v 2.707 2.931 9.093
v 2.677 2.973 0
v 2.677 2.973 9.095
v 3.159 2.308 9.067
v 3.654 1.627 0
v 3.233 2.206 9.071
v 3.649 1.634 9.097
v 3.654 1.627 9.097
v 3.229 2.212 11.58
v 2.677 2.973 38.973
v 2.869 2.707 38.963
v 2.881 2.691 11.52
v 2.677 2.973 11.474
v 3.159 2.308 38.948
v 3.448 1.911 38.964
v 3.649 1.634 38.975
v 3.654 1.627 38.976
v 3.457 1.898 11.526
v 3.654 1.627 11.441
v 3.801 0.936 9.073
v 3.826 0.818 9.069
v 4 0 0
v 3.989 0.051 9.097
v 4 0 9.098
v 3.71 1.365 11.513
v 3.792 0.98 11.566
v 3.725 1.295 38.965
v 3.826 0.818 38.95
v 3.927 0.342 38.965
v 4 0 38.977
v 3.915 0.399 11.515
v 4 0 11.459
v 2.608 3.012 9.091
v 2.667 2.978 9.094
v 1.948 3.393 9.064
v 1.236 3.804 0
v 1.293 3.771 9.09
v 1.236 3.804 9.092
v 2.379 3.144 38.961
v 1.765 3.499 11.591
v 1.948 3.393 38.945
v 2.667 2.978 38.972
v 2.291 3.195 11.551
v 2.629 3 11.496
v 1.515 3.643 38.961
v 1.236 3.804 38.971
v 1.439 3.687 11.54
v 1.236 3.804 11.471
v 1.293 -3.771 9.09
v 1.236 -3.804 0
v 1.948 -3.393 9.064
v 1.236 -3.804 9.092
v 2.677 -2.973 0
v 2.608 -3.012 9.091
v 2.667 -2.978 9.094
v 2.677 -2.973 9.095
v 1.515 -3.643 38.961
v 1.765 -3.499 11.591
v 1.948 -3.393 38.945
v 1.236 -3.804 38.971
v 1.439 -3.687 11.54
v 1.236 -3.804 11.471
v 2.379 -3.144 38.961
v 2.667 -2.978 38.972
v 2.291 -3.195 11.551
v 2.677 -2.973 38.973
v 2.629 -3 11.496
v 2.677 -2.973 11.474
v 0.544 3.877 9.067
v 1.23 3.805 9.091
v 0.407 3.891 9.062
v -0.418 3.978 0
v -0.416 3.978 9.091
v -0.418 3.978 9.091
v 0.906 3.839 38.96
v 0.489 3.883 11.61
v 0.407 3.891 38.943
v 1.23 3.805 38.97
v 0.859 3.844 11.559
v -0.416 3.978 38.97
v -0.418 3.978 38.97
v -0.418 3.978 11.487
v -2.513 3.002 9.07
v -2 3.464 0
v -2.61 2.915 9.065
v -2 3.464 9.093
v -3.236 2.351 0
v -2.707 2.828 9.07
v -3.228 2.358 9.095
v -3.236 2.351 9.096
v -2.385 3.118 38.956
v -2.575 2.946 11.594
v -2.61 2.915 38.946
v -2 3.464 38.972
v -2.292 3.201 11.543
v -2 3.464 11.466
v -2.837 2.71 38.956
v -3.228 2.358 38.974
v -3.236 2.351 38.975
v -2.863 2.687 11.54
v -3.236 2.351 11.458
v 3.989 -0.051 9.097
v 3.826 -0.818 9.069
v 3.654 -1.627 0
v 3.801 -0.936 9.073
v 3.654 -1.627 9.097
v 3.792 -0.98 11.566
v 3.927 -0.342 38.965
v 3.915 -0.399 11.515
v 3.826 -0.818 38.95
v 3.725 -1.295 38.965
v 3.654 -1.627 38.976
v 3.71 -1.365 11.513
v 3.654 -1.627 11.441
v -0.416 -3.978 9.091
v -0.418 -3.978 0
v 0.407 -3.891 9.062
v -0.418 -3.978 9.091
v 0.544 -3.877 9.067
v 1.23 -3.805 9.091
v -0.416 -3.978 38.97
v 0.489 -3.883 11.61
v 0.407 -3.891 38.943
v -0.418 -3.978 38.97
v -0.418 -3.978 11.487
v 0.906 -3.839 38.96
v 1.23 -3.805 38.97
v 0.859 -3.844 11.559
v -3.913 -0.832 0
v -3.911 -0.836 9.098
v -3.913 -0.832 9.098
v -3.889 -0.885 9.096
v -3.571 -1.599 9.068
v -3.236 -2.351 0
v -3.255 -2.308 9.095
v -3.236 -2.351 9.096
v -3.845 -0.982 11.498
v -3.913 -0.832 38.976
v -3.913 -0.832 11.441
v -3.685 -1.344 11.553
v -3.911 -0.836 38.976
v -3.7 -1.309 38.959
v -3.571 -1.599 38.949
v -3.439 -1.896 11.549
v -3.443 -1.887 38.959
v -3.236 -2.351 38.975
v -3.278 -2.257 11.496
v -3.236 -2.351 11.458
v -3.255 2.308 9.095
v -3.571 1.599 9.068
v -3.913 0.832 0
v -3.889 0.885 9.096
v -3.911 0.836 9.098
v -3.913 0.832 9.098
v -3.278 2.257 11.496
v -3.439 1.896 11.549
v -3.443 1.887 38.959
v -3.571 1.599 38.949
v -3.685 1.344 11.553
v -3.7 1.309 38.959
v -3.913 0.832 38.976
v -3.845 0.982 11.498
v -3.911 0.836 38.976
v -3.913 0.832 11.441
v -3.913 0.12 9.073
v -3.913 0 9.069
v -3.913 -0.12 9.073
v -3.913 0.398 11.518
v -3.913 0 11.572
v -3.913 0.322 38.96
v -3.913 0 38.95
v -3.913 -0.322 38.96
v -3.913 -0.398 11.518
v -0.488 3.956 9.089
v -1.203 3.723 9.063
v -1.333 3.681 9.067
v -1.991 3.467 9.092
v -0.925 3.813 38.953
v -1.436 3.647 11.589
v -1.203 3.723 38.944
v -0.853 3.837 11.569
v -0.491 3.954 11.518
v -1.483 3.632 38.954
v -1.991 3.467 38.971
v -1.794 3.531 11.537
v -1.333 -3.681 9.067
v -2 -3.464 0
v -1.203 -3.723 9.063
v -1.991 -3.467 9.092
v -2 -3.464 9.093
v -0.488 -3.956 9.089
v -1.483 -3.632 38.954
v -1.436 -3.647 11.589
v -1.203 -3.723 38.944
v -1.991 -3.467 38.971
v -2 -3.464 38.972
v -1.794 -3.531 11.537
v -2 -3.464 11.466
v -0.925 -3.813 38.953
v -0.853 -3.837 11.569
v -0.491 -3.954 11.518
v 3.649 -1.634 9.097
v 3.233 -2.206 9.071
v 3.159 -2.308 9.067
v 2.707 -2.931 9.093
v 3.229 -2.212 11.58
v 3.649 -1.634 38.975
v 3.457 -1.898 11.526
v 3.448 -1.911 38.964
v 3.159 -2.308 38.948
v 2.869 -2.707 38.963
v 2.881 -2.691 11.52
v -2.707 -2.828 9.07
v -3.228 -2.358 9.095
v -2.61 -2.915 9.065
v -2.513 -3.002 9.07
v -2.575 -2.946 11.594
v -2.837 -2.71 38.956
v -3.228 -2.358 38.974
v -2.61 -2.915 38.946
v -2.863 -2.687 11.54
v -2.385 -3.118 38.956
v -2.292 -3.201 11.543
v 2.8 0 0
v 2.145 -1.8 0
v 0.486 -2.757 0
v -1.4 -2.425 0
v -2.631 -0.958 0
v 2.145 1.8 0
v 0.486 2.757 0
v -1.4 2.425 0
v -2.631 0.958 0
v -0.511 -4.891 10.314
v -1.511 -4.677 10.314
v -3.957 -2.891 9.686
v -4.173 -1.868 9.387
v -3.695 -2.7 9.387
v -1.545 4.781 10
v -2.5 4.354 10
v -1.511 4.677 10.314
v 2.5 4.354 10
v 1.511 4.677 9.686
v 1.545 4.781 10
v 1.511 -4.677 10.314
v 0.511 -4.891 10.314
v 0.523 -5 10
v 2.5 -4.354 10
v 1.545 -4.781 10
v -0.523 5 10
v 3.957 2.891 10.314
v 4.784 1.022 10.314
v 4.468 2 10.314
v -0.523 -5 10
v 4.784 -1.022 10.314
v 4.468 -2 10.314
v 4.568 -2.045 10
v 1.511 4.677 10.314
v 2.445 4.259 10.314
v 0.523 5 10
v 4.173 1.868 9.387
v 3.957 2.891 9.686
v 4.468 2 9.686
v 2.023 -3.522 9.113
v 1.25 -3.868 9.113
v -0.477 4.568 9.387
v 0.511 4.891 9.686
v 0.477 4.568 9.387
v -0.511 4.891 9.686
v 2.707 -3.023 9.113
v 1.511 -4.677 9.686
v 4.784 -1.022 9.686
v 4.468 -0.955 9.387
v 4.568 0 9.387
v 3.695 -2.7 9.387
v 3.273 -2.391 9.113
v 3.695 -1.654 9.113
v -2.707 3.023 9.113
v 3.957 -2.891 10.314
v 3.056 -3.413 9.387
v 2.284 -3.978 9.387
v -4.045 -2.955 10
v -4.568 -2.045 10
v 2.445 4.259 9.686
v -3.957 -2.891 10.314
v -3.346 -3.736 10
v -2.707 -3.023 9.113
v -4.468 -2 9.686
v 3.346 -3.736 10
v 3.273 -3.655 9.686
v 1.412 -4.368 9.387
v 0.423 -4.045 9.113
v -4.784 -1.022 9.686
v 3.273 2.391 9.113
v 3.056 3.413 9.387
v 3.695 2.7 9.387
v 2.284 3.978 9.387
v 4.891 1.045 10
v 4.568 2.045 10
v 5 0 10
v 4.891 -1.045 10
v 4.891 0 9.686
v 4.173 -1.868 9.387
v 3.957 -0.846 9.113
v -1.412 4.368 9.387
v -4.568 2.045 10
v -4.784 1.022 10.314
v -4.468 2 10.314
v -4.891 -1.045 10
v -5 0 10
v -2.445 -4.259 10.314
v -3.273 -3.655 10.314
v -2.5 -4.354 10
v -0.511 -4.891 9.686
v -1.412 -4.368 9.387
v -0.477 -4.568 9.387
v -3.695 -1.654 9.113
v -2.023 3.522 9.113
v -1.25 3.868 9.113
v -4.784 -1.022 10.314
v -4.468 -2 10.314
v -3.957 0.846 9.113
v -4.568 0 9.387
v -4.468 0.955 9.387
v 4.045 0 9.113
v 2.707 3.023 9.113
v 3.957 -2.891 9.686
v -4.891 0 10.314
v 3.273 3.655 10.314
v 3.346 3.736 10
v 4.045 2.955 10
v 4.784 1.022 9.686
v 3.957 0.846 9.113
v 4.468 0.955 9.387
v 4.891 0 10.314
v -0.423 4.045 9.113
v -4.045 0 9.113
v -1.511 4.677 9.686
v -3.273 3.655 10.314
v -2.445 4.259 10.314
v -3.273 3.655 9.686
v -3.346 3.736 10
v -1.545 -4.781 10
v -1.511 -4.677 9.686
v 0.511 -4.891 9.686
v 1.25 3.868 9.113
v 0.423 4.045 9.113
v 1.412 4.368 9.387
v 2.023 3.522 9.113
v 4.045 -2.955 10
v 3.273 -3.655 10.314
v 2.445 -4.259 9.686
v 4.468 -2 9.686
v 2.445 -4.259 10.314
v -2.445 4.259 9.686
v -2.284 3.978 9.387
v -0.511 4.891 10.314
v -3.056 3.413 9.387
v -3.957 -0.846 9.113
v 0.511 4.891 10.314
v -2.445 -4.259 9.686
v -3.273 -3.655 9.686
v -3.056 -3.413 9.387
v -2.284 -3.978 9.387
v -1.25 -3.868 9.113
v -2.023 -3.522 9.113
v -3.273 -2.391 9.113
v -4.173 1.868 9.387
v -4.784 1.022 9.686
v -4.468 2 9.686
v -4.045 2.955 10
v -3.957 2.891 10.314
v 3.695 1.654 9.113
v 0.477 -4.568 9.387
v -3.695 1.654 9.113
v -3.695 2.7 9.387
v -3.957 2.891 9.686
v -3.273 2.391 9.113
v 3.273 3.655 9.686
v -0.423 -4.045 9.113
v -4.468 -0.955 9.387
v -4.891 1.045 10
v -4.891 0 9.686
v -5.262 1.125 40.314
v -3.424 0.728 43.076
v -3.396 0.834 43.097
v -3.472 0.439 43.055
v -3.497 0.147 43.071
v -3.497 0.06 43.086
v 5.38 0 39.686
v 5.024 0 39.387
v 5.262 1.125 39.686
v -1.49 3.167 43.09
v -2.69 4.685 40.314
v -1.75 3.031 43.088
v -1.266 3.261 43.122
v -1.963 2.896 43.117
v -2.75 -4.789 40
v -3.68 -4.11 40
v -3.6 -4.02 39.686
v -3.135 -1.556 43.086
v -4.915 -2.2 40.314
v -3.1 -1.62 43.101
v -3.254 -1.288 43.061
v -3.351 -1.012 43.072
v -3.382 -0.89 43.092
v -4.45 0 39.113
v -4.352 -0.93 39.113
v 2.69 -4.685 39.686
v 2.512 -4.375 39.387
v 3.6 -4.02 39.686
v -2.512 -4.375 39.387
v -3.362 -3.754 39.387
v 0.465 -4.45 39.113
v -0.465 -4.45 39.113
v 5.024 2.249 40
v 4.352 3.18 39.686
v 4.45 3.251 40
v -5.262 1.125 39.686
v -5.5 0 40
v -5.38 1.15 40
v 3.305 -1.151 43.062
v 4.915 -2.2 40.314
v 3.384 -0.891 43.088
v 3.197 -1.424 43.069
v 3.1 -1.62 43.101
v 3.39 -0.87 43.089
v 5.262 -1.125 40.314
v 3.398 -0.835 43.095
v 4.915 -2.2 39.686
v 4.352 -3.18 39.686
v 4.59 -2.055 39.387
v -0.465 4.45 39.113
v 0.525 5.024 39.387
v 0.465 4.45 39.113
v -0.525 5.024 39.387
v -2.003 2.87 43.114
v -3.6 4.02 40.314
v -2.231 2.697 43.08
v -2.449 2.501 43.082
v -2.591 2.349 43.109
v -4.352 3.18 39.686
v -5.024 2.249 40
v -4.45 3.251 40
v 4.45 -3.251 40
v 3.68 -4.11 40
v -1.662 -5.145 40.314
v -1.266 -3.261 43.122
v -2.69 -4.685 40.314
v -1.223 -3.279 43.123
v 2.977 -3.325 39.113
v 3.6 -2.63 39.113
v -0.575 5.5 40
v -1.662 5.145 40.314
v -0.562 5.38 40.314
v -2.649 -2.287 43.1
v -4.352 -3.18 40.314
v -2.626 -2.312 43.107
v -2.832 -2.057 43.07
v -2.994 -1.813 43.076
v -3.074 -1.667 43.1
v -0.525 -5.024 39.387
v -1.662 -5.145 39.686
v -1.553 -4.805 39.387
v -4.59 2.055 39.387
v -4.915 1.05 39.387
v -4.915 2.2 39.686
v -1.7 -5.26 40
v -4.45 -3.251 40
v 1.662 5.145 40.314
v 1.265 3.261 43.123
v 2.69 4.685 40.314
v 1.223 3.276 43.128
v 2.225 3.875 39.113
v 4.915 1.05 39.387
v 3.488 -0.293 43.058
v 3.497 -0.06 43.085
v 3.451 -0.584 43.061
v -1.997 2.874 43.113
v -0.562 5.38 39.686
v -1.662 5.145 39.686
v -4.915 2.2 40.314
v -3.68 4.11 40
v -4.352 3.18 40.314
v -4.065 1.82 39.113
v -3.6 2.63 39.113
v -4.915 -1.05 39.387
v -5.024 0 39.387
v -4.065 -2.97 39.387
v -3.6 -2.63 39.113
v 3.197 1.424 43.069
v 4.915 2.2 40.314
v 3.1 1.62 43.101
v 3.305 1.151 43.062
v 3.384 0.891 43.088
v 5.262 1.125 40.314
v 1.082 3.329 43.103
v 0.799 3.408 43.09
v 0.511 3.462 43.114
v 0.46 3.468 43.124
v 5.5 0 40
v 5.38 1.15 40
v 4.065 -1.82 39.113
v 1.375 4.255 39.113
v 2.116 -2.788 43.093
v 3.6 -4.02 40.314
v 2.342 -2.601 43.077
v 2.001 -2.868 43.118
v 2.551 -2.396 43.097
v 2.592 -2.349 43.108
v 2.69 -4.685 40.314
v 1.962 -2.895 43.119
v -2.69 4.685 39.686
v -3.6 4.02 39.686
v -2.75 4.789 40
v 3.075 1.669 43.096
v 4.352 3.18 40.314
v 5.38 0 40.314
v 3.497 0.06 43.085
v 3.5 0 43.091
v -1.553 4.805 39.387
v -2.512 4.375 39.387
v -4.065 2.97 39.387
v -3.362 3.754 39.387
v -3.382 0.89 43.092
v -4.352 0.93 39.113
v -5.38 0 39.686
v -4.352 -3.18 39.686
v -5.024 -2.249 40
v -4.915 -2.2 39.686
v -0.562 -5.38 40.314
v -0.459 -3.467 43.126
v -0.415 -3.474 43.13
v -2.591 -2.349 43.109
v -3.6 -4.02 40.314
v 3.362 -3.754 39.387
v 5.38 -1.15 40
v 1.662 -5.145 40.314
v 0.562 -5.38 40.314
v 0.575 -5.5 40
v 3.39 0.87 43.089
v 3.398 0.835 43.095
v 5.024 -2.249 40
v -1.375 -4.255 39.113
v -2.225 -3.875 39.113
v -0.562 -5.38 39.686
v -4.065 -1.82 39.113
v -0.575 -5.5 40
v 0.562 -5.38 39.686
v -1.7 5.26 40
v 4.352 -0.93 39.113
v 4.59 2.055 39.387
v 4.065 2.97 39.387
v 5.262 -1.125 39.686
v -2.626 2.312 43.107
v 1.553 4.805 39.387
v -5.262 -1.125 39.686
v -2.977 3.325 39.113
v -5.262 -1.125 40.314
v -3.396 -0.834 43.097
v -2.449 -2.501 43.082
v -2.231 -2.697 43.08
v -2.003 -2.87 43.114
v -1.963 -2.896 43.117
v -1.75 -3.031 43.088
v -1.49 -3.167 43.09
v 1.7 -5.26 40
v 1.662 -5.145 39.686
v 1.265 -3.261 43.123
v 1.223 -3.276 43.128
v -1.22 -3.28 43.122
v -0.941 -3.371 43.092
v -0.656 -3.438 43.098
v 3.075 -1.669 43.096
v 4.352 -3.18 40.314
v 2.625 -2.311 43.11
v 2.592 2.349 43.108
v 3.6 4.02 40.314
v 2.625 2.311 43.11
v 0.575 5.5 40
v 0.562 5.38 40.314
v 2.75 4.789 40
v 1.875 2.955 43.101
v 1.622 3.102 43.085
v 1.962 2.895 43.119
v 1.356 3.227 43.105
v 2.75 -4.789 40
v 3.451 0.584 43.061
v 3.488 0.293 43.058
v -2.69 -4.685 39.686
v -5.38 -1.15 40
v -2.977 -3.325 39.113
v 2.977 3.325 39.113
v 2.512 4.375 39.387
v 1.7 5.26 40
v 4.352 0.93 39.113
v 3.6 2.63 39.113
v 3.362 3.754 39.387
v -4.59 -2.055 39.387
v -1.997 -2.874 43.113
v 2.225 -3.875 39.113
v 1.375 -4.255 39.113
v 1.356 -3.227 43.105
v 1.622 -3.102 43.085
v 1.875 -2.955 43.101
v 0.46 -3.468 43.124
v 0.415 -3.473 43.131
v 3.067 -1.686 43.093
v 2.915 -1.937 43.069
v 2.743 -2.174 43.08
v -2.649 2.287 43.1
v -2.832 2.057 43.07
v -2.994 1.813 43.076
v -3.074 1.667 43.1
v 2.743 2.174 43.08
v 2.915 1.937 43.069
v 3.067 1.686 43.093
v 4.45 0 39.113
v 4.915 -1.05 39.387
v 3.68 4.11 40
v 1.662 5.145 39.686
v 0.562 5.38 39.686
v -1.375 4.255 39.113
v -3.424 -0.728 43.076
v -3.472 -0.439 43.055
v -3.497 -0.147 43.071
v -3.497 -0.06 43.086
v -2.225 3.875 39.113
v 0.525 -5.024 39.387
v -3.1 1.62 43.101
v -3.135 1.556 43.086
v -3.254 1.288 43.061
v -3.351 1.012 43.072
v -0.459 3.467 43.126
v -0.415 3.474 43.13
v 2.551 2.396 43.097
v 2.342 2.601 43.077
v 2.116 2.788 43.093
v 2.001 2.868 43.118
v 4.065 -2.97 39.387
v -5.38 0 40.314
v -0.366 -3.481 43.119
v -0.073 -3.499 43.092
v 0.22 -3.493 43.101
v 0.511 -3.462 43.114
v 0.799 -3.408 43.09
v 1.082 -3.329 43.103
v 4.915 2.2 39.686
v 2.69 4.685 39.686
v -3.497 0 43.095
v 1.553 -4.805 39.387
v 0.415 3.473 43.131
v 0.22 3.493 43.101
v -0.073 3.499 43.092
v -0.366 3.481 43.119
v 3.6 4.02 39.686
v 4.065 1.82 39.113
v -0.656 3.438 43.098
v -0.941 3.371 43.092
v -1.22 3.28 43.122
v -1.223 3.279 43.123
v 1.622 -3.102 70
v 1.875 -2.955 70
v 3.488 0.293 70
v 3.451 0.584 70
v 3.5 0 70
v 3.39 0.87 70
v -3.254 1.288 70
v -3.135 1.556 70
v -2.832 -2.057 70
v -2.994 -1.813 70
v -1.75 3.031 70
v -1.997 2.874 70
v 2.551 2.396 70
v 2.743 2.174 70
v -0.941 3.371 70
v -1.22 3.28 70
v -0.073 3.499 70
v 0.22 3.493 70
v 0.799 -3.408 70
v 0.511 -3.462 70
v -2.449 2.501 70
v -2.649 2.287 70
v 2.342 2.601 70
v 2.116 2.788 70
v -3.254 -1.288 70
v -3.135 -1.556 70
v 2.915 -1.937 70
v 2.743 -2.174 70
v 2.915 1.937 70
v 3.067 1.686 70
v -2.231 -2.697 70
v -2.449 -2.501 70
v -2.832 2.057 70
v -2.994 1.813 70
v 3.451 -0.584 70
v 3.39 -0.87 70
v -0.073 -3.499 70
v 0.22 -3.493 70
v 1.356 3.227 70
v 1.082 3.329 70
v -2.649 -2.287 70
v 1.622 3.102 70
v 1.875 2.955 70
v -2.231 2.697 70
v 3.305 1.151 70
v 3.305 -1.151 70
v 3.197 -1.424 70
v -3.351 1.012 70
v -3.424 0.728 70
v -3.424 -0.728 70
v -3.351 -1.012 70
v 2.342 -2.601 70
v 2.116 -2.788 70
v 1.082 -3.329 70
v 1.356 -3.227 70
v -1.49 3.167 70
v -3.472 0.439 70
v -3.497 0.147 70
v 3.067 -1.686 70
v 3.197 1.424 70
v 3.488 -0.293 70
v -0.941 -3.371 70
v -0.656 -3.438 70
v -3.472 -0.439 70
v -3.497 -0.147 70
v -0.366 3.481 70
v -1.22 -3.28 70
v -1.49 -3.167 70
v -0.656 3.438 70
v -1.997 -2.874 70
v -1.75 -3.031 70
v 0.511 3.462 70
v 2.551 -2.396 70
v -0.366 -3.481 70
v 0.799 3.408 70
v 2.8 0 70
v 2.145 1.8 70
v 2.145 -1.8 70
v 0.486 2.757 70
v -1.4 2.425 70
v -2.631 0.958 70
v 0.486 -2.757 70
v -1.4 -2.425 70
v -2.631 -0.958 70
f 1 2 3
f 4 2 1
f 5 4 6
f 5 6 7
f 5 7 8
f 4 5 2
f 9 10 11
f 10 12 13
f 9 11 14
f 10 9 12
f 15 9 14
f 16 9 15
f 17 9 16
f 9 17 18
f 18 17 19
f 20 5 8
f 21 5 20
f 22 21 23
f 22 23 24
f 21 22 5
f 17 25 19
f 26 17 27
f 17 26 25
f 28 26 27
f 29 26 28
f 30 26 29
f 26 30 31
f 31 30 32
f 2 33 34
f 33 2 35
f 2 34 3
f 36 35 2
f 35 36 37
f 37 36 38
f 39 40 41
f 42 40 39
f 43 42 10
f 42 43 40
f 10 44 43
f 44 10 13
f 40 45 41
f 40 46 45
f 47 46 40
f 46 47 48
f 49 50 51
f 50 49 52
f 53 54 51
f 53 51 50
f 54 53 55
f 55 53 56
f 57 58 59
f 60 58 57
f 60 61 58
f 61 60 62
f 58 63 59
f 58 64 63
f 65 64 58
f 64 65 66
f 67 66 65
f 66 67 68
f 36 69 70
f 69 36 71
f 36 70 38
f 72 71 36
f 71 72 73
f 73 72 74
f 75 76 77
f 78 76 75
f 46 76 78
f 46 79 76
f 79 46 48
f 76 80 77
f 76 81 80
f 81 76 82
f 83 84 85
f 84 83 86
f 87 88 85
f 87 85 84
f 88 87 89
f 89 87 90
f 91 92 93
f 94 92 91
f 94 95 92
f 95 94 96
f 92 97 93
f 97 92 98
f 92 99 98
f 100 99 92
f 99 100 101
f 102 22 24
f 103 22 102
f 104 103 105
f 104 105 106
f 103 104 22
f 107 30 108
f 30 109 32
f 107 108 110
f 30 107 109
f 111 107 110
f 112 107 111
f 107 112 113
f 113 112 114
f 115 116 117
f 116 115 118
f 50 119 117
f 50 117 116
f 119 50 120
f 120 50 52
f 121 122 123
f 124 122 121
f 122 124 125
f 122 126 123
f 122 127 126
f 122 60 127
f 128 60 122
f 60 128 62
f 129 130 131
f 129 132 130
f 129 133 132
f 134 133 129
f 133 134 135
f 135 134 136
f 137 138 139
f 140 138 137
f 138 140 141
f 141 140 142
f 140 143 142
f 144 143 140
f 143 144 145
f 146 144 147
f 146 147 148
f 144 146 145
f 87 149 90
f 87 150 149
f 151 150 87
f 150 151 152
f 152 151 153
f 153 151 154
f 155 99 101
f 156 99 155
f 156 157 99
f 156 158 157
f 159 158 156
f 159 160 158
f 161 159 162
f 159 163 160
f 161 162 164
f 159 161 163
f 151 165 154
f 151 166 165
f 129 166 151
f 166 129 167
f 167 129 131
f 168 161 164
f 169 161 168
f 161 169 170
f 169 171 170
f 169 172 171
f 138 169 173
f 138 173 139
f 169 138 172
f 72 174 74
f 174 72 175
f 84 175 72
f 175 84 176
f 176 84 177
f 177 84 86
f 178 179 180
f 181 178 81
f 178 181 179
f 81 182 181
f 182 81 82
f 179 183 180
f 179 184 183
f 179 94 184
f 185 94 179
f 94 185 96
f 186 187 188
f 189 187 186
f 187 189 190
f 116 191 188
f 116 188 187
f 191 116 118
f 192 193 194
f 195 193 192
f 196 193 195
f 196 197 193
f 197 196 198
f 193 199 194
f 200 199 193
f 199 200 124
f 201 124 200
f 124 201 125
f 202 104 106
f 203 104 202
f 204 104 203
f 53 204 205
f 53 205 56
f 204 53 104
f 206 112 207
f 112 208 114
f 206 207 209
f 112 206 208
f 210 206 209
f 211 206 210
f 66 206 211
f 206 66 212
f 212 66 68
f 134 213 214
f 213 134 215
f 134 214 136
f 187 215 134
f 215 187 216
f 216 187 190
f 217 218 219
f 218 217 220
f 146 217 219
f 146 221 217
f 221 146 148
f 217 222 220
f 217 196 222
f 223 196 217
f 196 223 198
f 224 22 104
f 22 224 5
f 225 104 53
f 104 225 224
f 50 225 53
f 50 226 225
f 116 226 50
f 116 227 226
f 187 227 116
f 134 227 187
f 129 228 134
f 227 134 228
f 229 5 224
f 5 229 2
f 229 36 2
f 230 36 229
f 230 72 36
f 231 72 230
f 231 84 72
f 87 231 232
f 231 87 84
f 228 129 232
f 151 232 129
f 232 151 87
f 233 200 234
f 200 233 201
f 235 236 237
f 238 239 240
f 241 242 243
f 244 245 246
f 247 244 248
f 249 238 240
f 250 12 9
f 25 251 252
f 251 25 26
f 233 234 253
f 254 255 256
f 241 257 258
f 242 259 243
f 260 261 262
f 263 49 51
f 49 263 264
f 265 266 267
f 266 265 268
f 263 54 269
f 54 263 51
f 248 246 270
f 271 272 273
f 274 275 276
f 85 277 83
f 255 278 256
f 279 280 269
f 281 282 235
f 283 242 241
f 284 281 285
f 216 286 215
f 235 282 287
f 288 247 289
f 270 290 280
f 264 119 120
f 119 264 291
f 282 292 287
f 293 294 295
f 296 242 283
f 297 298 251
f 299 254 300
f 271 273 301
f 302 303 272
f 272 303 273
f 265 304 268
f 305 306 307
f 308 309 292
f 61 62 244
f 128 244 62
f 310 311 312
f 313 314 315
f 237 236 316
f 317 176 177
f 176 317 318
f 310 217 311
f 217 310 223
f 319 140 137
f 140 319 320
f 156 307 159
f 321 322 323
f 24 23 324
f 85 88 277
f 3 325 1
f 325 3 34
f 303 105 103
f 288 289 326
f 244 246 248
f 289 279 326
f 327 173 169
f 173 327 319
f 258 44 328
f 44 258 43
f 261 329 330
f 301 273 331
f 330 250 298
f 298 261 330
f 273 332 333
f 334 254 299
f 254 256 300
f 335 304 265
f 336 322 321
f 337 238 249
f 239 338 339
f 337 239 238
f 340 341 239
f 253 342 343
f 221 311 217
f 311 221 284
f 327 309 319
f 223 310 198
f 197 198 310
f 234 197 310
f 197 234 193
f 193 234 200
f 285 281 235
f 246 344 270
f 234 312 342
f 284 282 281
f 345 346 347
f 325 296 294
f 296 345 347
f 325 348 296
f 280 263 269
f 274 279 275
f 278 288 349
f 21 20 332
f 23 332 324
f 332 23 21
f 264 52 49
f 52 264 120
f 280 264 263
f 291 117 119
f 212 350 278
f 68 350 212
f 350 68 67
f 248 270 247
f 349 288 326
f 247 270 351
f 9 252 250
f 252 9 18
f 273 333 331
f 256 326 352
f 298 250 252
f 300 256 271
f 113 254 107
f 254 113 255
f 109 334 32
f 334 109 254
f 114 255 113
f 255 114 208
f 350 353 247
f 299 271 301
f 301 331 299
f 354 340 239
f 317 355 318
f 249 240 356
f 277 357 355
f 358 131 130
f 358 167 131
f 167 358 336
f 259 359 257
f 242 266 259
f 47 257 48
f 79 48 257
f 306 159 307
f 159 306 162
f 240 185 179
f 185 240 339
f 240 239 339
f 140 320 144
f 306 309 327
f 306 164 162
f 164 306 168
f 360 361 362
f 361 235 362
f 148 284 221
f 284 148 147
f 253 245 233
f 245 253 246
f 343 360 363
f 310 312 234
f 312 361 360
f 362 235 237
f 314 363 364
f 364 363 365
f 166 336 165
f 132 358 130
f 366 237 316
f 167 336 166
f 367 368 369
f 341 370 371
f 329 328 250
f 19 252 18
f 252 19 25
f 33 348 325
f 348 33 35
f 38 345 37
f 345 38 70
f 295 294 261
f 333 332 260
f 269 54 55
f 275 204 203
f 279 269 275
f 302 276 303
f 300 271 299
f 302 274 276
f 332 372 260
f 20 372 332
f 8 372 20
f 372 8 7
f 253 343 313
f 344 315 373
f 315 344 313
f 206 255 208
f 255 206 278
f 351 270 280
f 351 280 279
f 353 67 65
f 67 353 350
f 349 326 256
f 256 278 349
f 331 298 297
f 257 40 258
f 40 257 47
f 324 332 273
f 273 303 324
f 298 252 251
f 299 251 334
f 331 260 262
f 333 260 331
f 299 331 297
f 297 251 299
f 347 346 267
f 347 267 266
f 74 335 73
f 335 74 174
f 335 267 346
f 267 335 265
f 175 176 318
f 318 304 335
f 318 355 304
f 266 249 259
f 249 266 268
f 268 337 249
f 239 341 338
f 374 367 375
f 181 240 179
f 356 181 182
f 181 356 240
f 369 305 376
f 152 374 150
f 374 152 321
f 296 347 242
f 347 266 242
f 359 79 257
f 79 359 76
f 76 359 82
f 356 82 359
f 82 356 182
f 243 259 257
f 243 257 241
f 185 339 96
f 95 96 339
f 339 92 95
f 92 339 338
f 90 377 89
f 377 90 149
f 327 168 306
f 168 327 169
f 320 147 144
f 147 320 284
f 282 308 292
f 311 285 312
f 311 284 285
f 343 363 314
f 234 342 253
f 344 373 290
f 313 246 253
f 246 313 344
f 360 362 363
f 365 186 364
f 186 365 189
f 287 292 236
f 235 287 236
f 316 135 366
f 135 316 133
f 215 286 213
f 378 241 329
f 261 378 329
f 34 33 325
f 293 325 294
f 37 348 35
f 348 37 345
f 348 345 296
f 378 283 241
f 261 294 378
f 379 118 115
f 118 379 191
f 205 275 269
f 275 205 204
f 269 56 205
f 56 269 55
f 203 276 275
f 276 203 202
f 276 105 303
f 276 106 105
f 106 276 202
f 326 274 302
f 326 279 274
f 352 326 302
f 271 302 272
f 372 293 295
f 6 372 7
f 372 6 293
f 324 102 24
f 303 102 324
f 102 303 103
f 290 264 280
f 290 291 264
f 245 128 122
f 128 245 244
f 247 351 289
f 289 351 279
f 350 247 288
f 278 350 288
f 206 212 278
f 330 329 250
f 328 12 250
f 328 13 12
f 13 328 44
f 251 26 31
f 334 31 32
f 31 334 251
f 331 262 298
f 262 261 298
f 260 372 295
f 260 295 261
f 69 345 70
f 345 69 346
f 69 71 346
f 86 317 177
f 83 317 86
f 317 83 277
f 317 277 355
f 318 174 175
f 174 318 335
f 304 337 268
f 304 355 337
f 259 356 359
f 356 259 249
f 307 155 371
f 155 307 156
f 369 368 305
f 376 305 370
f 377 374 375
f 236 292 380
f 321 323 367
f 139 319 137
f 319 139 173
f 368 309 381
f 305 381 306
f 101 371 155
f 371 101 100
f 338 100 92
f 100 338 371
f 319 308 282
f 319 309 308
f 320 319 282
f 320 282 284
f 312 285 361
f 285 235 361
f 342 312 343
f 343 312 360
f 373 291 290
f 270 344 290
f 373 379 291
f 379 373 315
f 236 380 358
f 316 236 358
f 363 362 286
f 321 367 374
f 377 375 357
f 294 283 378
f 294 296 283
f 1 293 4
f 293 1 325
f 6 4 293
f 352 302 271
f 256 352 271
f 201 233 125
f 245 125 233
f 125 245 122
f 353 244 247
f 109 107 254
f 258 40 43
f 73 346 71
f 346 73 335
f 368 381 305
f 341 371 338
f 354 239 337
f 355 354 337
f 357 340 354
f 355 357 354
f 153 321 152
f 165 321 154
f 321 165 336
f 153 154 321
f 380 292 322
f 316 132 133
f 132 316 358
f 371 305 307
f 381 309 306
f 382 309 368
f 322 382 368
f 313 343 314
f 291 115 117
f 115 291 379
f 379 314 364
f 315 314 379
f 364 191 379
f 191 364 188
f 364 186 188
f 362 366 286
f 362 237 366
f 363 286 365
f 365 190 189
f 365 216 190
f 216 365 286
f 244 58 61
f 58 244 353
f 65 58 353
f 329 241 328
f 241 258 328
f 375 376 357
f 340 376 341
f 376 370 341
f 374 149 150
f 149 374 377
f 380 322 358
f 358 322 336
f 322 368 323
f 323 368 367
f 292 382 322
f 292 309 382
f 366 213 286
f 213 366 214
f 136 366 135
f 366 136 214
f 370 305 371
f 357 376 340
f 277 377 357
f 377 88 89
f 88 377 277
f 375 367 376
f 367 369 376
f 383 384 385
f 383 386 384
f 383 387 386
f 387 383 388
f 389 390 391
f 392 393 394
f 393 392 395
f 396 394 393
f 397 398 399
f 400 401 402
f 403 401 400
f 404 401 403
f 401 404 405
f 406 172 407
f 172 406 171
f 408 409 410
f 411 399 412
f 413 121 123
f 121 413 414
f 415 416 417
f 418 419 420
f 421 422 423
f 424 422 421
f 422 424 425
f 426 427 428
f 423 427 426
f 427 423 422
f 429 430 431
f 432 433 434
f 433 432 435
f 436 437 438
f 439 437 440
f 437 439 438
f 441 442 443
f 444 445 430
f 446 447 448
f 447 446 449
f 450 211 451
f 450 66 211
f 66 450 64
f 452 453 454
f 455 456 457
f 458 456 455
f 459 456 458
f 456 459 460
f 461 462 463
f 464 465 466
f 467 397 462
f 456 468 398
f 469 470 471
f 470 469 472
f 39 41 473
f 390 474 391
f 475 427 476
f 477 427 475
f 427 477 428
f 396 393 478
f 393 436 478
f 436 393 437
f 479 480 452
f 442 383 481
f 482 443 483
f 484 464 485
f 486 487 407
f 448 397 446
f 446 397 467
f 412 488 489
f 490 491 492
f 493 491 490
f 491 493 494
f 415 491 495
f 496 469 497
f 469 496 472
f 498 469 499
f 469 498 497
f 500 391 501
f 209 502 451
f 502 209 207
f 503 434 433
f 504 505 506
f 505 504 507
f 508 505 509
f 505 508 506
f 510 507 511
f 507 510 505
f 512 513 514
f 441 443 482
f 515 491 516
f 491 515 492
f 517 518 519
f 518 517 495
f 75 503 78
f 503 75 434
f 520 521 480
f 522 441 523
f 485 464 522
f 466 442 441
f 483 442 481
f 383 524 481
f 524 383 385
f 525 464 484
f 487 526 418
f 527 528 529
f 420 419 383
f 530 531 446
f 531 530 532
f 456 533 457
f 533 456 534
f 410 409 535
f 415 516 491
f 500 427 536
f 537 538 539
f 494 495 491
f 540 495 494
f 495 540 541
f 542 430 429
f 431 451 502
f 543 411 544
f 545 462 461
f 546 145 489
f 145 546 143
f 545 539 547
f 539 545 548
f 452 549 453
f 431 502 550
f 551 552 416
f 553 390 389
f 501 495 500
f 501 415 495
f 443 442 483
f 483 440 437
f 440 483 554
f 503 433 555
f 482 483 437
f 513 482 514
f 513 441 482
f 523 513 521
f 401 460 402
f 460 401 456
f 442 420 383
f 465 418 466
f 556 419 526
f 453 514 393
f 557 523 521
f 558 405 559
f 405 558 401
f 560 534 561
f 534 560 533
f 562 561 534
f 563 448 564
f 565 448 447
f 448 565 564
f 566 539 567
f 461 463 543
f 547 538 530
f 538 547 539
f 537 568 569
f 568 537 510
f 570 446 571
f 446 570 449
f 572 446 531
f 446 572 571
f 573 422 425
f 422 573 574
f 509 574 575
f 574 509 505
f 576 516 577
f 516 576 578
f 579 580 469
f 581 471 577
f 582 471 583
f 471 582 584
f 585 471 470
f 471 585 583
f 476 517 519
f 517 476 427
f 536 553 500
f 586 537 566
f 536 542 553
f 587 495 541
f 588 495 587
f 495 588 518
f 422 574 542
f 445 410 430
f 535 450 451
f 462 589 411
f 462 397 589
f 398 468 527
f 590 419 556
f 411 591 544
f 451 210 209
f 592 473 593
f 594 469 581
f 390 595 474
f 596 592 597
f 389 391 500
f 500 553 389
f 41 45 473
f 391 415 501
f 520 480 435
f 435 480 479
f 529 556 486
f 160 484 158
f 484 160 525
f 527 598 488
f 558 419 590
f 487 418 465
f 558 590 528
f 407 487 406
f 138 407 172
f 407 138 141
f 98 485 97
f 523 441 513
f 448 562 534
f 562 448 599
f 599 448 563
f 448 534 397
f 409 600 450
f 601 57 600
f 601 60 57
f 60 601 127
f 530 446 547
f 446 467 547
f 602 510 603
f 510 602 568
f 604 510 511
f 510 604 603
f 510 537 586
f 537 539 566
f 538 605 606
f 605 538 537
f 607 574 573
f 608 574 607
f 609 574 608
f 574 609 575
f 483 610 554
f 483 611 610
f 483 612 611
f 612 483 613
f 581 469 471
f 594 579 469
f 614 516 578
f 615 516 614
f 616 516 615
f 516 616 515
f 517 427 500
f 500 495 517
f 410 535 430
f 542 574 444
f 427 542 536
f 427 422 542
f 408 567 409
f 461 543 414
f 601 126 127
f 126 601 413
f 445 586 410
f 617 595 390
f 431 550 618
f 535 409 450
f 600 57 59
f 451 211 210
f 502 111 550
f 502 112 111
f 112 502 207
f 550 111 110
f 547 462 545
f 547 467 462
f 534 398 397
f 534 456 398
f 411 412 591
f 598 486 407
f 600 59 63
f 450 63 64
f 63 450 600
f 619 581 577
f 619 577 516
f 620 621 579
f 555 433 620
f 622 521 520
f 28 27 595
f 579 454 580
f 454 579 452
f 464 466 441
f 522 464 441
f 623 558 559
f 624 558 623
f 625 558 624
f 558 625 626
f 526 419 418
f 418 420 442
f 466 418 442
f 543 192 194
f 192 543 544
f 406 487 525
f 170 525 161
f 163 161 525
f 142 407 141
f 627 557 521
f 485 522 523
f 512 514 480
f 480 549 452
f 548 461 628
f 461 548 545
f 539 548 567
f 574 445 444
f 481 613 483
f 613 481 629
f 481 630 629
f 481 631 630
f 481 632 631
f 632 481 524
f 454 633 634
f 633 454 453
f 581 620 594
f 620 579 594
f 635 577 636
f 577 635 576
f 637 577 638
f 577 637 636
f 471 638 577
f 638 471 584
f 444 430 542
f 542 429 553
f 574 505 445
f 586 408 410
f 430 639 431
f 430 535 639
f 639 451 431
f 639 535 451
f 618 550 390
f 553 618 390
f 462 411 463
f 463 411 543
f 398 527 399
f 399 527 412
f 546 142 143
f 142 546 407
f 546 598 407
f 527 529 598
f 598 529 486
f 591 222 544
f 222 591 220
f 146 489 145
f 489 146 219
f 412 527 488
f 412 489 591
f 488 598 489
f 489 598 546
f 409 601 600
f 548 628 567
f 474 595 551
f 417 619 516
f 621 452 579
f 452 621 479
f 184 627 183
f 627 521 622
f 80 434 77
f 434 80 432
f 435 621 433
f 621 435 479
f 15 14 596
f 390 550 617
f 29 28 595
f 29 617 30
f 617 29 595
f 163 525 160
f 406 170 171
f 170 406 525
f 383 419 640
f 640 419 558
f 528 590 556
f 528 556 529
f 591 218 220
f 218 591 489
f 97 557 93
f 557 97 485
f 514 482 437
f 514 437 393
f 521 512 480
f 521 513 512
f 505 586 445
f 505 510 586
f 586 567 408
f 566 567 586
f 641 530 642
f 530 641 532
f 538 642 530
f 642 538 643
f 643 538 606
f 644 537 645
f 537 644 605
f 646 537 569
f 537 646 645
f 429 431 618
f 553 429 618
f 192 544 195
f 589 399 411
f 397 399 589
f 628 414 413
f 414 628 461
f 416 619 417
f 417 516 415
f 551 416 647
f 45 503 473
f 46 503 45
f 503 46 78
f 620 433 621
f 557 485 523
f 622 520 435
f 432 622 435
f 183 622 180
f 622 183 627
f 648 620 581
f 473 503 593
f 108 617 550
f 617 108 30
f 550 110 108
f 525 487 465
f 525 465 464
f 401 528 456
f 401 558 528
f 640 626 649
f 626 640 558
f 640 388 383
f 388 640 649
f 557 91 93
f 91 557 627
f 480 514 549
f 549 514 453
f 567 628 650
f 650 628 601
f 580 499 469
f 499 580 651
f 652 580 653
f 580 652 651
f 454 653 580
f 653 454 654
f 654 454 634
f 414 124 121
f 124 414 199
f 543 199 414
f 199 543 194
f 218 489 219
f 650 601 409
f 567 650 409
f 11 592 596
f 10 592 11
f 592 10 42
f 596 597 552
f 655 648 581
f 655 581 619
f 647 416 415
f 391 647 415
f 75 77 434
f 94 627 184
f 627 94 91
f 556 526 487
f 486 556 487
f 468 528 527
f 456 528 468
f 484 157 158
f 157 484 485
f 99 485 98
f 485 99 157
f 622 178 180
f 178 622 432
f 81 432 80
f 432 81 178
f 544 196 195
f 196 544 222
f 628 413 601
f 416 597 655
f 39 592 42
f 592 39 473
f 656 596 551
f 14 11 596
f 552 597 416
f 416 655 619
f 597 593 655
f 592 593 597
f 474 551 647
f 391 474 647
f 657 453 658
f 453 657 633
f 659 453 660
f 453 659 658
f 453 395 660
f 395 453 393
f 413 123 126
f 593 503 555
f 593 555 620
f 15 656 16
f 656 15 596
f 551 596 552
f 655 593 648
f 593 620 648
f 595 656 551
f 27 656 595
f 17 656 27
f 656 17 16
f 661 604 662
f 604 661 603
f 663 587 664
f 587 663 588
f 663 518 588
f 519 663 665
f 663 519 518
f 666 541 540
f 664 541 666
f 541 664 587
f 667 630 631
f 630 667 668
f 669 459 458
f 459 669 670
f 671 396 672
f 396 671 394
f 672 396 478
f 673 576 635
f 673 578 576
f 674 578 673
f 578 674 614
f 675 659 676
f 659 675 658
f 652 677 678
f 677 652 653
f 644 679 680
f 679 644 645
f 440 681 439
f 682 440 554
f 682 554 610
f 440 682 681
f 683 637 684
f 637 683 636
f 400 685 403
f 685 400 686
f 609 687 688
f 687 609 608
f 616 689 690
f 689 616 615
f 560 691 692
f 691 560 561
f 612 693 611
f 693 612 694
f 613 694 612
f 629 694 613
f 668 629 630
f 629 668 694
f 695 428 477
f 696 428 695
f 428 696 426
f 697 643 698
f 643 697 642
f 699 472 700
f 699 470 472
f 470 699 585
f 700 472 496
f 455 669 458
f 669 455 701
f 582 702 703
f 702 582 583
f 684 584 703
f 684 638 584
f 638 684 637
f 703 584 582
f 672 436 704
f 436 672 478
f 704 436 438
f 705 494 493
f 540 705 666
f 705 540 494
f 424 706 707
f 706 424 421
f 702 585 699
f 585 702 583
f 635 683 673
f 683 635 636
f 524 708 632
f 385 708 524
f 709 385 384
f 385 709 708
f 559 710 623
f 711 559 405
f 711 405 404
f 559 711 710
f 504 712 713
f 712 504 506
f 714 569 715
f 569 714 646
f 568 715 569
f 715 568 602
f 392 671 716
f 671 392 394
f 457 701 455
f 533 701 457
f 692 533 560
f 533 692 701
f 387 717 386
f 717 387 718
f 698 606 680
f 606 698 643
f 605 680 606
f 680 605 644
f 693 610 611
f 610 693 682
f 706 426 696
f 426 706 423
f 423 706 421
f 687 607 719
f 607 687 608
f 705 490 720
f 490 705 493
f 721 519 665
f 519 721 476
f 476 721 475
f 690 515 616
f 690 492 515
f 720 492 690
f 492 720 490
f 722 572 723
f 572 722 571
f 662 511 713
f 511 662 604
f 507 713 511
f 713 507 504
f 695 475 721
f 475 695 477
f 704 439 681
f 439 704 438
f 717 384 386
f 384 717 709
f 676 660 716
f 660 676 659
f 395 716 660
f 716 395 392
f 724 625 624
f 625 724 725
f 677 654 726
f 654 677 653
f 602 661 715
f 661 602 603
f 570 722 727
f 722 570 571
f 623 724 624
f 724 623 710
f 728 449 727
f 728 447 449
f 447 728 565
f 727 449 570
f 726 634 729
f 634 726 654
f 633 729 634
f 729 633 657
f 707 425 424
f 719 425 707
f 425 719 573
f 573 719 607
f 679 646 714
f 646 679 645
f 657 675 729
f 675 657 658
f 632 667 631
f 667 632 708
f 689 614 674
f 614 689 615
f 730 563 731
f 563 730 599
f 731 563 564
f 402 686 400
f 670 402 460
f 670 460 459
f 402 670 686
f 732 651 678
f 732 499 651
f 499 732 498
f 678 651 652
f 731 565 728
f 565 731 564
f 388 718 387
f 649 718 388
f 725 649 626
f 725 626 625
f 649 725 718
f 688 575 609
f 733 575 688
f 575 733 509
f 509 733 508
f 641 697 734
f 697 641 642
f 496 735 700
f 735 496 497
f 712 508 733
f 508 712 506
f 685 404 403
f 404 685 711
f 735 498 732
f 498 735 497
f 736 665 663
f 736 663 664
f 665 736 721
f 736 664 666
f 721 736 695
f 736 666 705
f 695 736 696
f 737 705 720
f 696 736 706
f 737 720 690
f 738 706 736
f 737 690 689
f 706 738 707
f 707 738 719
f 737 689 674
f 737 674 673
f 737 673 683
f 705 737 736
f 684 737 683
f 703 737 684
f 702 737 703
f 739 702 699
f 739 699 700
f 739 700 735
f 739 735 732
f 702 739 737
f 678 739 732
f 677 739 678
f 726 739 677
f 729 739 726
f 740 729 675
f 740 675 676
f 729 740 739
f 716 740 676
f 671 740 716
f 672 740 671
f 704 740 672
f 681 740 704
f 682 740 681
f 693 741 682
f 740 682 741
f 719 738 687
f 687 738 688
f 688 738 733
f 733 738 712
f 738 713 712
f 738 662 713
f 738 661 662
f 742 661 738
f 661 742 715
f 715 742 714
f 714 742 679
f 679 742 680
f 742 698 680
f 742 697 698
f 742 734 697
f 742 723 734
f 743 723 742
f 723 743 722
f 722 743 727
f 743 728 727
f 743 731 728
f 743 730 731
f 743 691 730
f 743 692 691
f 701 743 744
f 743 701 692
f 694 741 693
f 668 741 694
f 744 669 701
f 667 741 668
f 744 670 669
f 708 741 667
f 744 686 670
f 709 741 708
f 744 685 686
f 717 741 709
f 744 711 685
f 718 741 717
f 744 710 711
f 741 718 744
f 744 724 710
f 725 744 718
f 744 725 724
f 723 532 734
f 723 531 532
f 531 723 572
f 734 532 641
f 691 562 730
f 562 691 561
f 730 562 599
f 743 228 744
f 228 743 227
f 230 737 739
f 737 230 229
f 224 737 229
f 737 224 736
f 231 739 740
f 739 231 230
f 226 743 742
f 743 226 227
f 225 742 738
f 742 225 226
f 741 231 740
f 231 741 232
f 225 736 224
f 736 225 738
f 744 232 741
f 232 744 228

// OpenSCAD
//model of vintage lamp hopefully have open tube in the middle to have cord goe through
//base
difference(){
union(){
intersection(){
translate(0,0,-1);
cylinder(h=30,r=20);
resize(newsize=[30,30,20])
sphere(r=20 ,center = false);
}//difference_ends

//base

//main shaft
//**textured shaft 
translate(0,0,20);
cylinder(h=40,r=4,$fn=15);
//textured shaft ends

//bottom_detail_groove



translate([0,0,10])
hull(){
resize(newsize=[10,10,3])
sphere(r= 10, center = true);

translate([0,0,2])
resize(newsize=[7,7,2])
sphere(r= 7,center = true);

}//end of hull

//end_bottom_detail_groove


//top_detail_shaft

translate([0,0,40])
hull(){
resize(newsize=[11,11,3])
sphere(r= 15, center = true);

translate([0,0,3])
resize(newsize=[7,7,2])
sphere(r= 8,center = true);

}//end of hull

//end_top_detail_shaft

//main_shaft

translate([0,0,40])
cylinder(h=30,r=3.5,$fn=75);


//main_shaft_end
}//end_union
translate([0,0,-2])
cylinder(h=80,r=2.8);
}//end_difference
